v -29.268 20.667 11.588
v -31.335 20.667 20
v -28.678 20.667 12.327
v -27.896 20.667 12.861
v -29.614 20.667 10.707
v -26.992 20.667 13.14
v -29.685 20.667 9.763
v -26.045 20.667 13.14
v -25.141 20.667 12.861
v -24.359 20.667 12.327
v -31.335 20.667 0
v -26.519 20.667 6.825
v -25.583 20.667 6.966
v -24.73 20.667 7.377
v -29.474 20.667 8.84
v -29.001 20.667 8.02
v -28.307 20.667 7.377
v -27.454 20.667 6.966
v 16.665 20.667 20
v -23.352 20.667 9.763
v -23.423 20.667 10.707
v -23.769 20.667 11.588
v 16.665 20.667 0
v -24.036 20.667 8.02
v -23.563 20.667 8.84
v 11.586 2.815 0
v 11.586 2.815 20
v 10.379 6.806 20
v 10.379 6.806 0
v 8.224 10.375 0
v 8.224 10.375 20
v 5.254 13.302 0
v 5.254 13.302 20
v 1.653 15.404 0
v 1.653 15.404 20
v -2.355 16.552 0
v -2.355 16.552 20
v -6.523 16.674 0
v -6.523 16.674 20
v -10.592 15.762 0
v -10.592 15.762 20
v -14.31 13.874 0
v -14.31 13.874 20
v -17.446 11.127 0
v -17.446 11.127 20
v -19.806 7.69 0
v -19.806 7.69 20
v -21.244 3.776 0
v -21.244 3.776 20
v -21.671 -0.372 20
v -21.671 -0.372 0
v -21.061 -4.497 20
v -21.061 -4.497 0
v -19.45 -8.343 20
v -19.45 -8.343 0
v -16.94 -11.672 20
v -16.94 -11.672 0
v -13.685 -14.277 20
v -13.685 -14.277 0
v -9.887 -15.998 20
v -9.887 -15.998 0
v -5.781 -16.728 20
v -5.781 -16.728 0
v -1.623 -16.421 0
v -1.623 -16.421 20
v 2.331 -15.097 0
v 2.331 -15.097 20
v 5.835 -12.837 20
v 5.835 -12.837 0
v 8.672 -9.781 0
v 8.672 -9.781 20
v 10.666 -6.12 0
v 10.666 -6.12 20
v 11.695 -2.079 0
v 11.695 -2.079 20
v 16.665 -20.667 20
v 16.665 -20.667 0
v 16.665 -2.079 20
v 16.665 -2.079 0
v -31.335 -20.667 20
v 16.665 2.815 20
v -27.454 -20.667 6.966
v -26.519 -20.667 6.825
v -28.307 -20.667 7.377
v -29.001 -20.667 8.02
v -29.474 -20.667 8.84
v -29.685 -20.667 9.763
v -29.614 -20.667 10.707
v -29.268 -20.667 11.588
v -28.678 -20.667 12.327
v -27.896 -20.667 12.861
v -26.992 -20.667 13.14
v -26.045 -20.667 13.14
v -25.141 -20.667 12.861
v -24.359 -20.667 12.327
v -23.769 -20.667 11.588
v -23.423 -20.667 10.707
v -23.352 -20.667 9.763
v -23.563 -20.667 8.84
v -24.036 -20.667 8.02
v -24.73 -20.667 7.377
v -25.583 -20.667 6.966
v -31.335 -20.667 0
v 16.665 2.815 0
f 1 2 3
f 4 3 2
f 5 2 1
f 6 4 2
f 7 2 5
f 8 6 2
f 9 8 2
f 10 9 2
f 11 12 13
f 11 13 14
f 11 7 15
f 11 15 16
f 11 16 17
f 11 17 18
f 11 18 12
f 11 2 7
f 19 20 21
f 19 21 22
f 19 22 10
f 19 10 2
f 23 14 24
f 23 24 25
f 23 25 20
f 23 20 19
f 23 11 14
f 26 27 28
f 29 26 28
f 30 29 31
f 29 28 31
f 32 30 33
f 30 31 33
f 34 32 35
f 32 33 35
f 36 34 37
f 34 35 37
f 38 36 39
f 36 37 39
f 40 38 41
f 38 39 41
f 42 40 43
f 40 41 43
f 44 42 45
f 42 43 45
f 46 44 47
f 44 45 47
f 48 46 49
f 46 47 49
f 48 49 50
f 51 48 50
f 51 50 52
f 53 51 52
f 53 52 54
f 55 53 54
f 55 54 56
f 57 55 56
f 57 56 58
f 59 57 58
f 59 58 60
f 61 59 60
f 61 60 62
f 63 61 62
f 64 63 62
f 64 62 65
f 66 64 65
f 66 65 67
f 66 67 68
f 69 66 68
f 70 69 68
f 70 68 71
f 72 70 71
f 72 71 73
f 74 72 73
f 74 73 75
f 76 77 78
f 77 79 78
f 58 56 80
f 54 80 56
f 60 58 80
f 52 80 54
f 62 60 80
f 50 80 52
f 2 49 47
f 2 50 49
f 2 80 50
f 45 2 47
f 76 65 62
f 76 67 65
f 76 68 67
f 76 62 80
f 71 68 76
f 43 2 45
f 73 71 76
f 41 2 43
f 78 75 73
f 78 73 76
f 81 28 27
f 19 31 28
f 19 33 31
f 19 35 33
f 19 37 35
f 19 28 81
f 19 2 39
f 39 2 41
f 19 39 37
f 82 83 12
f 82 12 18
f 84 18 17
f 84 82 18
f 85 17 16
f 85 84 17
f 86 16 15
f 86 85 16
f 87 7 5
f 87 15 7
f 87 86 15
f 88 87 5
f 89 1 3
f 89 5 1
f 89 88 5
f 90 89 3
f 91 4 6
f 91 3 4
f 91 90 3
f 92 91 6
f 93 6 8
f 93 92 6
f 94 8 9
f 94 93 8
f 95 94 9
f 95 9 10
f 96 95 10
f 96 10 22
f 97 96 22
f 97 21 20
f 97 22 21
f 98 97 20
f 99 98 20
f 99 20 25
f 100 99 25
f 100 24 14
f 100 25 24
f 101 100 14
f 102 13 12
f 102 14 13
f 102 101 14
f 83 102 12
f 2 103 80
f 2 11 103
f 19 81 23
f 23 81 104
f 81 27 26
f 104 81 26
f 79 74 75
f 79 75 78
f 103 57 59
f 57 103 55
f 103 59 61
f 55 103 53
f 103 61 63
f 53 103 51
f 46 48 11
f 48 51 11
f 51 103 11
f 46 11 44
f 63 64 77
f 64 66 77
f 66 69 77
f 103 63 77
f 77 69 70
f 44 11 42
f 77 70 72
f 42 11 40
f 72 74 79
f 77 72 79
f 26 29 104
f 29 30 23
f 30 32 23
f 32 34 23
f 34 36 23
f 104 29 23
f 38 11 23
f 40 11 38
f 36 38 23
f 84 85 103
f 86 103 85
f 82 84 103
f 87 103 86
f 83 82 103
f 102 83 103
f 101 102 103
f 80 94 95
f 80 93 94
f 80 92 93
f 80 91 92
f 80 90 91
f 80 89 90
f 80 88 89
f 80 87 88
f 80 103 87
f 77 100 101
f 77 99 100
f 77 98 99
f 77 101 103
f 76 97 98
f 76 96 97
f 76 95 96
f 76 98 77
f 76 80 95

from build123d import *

# Parameters (mm, degrees)
CROQUIS1_W                    = 40
CROQUIS1_H                    = 31.334822808
SALIENTE_EXTRUIR1_DEPTH       = 20
CROQUIS2_W                    = 5.048174606
CROQUIS2_H                    = 4.893641636
CORTAR_EXTRUIR1_DEPTH         = 41.340288801
TALADRO1_D                    = 6.35
TALADRO_DE_MARGEN_PARA_M221_D = 25.4
CROQUIS7_W                    = 20
CROQUIS7_H                    = 12.852705172
CROQUIS7_H_2                  = 13.588476
SALIENTE_EXTRUIR2_DEPTH       = 8
CROQUIS8_W                    = 48
CROQUIS8_H                    = 20
SALIENTE_EXTRUIR3_DEPTH       = 5
CROQUIS9_R                    = 3.175
CORTAR_EXTRUIR2_DEPTH         = 43
CROQUIS10_W                   = 48
CROQUIS10_H                   = 20
SALIENTE_EXTRUIR4_DEPTH       = 5
CORTAR_EXTRUIR3_START         = -48
CROQUIS11_R                   = 3.175
CORTAR_EXTRUIR3_DEPTH         = 48
CROQUIS12_R                   = 16.75
CORTAR_EXTRUIR4_DEPTH         = 48


with BuildPart() as part:
    # Croquis1 → Saliente-Extruir1 (new body)
    with BuildSketch(Plane(origin=(0, 0, 0), x_dir=(-1, 0, 0), z_dir=(0, 0, -1))):
        with Locations((11.334822808, 0)):
            Rectangle(CROQUIS1_W, CROQUIS1_H)
    extrude(amount=-SALIENTE_EXTRUIR1_DEPTH)

    # Croquis2 → Cortar-Extruir1 (cut, through all)
    with BuildSketch(Plane.XY.offset(20)):
        with Locations((6.141089889, 0.367885414)):
            Rectangle(CROQUIS2_W, CROQUIS2_H)
    extrude(amount=-CORTAR_EXTRUIR1_DEPTH, mode=Mode.SUBTRACT)

    # Taladro1 (through all)
    with Locations(Plane(origin=(0, 15.667411404, 0), x_dir=(1, 0, 0), z_dir=(0, 1, 0))):
        with Locations((-26.51855843, -10)):
            Hole(TALADRO1_D / 2)

    # Taladro de margen para M221 (through all)
    with Locations(Plane(origin=(0, 0, 0), x_dir=(-1, 0, 0), z_dir=(0, 0, -1))):
        with Locations((8.767354232, 0)):
            Hole(TALADRO_DE_MARGEN_PARA_M221_D / 2)

    # Croquis7 → Saliente-Extruir2 (add)
    with BuildSketch(Plane(origin=(8.665177192, 0, 0), x_dir=(0, 0, -1), z_dir=(1, 0, 0))):
        with Locations((-10, 9.241058818)):
            Rectangle(CROQUIS7_W, CROQUIS7_H)
        with Locations((-10, -8.873173404)):
            Rectangle(CROQUIS7_W, CROQUIS7_H_2)
    extrude(amount=SALIENTE_EXTRUIR2_DEPTH)

    # Croquis8 → Saliente-Extruir3 (add)
    with BuildSketch(Plane(origin=(0, 15.667411404, 0), x_dir=(1, 0, 0), z_dir=(0, 1, 0))):
        with Locations((-7.334822808, -10)):
            Rectangle(CROQUIS8_W, CROQUIS8_H)
    extrude(amount=SALIENTE_EXTRUIR3_DEPTH)

    # Croquis9 → Cortar-Extruir2 (cut)
    with BuildSketch(Plane.XZ.offset(15.667411404)):
        with Locations(Location((-26.51855843, 10, 0), (0, 0, 90))):
            Circle(CROQUIS9_R)
    extrude(amount=-CORTAR_EXTRUIR2_DEPTH, mode=Mode.SUBTRACT)

    # Croquis10 → Saliente-Extruir4 (add)
    with BuildSketch(Plane.XZ.offset(15.667411404)):
        with Locations((-7.334822808, 10)):
            Rectangle(CROQUIS10_W, CROQUIS10_H)
    extrude(amount=SALIENTE_EXTRUIR4_DEPTH)

    # Croquis11 → Cortar-Extruir3 (cut)
    with BuildSketch(Plane(origin=(0, 20.667411404, 0), x_dir=(1, 0, 0), z_dir=(0, 1, 0)).offset(CORTAR_EXTRUIR3_START)):
        with Locations(Location((-26.51855843, -10, 0), (0, 0, 90))):
            Circle(CROQUIS11_R)
    extrude(amount=CORTAR_EXTRUIR3_DEPTH, mode=Mode.SUBTRACT)

    # Croquis12 → Cortar-Extruir4 (cut)
    with BuildSketch(Plane.XY.offset(20)):
        with Locations((-4.925615177, 0)):
            Circle(CROQUIS12_R)
    extrude(amount=-CORTAR_EXTRUIR4_DEPTH, mode=Mode.SUBTRACT)


solid = part.part
